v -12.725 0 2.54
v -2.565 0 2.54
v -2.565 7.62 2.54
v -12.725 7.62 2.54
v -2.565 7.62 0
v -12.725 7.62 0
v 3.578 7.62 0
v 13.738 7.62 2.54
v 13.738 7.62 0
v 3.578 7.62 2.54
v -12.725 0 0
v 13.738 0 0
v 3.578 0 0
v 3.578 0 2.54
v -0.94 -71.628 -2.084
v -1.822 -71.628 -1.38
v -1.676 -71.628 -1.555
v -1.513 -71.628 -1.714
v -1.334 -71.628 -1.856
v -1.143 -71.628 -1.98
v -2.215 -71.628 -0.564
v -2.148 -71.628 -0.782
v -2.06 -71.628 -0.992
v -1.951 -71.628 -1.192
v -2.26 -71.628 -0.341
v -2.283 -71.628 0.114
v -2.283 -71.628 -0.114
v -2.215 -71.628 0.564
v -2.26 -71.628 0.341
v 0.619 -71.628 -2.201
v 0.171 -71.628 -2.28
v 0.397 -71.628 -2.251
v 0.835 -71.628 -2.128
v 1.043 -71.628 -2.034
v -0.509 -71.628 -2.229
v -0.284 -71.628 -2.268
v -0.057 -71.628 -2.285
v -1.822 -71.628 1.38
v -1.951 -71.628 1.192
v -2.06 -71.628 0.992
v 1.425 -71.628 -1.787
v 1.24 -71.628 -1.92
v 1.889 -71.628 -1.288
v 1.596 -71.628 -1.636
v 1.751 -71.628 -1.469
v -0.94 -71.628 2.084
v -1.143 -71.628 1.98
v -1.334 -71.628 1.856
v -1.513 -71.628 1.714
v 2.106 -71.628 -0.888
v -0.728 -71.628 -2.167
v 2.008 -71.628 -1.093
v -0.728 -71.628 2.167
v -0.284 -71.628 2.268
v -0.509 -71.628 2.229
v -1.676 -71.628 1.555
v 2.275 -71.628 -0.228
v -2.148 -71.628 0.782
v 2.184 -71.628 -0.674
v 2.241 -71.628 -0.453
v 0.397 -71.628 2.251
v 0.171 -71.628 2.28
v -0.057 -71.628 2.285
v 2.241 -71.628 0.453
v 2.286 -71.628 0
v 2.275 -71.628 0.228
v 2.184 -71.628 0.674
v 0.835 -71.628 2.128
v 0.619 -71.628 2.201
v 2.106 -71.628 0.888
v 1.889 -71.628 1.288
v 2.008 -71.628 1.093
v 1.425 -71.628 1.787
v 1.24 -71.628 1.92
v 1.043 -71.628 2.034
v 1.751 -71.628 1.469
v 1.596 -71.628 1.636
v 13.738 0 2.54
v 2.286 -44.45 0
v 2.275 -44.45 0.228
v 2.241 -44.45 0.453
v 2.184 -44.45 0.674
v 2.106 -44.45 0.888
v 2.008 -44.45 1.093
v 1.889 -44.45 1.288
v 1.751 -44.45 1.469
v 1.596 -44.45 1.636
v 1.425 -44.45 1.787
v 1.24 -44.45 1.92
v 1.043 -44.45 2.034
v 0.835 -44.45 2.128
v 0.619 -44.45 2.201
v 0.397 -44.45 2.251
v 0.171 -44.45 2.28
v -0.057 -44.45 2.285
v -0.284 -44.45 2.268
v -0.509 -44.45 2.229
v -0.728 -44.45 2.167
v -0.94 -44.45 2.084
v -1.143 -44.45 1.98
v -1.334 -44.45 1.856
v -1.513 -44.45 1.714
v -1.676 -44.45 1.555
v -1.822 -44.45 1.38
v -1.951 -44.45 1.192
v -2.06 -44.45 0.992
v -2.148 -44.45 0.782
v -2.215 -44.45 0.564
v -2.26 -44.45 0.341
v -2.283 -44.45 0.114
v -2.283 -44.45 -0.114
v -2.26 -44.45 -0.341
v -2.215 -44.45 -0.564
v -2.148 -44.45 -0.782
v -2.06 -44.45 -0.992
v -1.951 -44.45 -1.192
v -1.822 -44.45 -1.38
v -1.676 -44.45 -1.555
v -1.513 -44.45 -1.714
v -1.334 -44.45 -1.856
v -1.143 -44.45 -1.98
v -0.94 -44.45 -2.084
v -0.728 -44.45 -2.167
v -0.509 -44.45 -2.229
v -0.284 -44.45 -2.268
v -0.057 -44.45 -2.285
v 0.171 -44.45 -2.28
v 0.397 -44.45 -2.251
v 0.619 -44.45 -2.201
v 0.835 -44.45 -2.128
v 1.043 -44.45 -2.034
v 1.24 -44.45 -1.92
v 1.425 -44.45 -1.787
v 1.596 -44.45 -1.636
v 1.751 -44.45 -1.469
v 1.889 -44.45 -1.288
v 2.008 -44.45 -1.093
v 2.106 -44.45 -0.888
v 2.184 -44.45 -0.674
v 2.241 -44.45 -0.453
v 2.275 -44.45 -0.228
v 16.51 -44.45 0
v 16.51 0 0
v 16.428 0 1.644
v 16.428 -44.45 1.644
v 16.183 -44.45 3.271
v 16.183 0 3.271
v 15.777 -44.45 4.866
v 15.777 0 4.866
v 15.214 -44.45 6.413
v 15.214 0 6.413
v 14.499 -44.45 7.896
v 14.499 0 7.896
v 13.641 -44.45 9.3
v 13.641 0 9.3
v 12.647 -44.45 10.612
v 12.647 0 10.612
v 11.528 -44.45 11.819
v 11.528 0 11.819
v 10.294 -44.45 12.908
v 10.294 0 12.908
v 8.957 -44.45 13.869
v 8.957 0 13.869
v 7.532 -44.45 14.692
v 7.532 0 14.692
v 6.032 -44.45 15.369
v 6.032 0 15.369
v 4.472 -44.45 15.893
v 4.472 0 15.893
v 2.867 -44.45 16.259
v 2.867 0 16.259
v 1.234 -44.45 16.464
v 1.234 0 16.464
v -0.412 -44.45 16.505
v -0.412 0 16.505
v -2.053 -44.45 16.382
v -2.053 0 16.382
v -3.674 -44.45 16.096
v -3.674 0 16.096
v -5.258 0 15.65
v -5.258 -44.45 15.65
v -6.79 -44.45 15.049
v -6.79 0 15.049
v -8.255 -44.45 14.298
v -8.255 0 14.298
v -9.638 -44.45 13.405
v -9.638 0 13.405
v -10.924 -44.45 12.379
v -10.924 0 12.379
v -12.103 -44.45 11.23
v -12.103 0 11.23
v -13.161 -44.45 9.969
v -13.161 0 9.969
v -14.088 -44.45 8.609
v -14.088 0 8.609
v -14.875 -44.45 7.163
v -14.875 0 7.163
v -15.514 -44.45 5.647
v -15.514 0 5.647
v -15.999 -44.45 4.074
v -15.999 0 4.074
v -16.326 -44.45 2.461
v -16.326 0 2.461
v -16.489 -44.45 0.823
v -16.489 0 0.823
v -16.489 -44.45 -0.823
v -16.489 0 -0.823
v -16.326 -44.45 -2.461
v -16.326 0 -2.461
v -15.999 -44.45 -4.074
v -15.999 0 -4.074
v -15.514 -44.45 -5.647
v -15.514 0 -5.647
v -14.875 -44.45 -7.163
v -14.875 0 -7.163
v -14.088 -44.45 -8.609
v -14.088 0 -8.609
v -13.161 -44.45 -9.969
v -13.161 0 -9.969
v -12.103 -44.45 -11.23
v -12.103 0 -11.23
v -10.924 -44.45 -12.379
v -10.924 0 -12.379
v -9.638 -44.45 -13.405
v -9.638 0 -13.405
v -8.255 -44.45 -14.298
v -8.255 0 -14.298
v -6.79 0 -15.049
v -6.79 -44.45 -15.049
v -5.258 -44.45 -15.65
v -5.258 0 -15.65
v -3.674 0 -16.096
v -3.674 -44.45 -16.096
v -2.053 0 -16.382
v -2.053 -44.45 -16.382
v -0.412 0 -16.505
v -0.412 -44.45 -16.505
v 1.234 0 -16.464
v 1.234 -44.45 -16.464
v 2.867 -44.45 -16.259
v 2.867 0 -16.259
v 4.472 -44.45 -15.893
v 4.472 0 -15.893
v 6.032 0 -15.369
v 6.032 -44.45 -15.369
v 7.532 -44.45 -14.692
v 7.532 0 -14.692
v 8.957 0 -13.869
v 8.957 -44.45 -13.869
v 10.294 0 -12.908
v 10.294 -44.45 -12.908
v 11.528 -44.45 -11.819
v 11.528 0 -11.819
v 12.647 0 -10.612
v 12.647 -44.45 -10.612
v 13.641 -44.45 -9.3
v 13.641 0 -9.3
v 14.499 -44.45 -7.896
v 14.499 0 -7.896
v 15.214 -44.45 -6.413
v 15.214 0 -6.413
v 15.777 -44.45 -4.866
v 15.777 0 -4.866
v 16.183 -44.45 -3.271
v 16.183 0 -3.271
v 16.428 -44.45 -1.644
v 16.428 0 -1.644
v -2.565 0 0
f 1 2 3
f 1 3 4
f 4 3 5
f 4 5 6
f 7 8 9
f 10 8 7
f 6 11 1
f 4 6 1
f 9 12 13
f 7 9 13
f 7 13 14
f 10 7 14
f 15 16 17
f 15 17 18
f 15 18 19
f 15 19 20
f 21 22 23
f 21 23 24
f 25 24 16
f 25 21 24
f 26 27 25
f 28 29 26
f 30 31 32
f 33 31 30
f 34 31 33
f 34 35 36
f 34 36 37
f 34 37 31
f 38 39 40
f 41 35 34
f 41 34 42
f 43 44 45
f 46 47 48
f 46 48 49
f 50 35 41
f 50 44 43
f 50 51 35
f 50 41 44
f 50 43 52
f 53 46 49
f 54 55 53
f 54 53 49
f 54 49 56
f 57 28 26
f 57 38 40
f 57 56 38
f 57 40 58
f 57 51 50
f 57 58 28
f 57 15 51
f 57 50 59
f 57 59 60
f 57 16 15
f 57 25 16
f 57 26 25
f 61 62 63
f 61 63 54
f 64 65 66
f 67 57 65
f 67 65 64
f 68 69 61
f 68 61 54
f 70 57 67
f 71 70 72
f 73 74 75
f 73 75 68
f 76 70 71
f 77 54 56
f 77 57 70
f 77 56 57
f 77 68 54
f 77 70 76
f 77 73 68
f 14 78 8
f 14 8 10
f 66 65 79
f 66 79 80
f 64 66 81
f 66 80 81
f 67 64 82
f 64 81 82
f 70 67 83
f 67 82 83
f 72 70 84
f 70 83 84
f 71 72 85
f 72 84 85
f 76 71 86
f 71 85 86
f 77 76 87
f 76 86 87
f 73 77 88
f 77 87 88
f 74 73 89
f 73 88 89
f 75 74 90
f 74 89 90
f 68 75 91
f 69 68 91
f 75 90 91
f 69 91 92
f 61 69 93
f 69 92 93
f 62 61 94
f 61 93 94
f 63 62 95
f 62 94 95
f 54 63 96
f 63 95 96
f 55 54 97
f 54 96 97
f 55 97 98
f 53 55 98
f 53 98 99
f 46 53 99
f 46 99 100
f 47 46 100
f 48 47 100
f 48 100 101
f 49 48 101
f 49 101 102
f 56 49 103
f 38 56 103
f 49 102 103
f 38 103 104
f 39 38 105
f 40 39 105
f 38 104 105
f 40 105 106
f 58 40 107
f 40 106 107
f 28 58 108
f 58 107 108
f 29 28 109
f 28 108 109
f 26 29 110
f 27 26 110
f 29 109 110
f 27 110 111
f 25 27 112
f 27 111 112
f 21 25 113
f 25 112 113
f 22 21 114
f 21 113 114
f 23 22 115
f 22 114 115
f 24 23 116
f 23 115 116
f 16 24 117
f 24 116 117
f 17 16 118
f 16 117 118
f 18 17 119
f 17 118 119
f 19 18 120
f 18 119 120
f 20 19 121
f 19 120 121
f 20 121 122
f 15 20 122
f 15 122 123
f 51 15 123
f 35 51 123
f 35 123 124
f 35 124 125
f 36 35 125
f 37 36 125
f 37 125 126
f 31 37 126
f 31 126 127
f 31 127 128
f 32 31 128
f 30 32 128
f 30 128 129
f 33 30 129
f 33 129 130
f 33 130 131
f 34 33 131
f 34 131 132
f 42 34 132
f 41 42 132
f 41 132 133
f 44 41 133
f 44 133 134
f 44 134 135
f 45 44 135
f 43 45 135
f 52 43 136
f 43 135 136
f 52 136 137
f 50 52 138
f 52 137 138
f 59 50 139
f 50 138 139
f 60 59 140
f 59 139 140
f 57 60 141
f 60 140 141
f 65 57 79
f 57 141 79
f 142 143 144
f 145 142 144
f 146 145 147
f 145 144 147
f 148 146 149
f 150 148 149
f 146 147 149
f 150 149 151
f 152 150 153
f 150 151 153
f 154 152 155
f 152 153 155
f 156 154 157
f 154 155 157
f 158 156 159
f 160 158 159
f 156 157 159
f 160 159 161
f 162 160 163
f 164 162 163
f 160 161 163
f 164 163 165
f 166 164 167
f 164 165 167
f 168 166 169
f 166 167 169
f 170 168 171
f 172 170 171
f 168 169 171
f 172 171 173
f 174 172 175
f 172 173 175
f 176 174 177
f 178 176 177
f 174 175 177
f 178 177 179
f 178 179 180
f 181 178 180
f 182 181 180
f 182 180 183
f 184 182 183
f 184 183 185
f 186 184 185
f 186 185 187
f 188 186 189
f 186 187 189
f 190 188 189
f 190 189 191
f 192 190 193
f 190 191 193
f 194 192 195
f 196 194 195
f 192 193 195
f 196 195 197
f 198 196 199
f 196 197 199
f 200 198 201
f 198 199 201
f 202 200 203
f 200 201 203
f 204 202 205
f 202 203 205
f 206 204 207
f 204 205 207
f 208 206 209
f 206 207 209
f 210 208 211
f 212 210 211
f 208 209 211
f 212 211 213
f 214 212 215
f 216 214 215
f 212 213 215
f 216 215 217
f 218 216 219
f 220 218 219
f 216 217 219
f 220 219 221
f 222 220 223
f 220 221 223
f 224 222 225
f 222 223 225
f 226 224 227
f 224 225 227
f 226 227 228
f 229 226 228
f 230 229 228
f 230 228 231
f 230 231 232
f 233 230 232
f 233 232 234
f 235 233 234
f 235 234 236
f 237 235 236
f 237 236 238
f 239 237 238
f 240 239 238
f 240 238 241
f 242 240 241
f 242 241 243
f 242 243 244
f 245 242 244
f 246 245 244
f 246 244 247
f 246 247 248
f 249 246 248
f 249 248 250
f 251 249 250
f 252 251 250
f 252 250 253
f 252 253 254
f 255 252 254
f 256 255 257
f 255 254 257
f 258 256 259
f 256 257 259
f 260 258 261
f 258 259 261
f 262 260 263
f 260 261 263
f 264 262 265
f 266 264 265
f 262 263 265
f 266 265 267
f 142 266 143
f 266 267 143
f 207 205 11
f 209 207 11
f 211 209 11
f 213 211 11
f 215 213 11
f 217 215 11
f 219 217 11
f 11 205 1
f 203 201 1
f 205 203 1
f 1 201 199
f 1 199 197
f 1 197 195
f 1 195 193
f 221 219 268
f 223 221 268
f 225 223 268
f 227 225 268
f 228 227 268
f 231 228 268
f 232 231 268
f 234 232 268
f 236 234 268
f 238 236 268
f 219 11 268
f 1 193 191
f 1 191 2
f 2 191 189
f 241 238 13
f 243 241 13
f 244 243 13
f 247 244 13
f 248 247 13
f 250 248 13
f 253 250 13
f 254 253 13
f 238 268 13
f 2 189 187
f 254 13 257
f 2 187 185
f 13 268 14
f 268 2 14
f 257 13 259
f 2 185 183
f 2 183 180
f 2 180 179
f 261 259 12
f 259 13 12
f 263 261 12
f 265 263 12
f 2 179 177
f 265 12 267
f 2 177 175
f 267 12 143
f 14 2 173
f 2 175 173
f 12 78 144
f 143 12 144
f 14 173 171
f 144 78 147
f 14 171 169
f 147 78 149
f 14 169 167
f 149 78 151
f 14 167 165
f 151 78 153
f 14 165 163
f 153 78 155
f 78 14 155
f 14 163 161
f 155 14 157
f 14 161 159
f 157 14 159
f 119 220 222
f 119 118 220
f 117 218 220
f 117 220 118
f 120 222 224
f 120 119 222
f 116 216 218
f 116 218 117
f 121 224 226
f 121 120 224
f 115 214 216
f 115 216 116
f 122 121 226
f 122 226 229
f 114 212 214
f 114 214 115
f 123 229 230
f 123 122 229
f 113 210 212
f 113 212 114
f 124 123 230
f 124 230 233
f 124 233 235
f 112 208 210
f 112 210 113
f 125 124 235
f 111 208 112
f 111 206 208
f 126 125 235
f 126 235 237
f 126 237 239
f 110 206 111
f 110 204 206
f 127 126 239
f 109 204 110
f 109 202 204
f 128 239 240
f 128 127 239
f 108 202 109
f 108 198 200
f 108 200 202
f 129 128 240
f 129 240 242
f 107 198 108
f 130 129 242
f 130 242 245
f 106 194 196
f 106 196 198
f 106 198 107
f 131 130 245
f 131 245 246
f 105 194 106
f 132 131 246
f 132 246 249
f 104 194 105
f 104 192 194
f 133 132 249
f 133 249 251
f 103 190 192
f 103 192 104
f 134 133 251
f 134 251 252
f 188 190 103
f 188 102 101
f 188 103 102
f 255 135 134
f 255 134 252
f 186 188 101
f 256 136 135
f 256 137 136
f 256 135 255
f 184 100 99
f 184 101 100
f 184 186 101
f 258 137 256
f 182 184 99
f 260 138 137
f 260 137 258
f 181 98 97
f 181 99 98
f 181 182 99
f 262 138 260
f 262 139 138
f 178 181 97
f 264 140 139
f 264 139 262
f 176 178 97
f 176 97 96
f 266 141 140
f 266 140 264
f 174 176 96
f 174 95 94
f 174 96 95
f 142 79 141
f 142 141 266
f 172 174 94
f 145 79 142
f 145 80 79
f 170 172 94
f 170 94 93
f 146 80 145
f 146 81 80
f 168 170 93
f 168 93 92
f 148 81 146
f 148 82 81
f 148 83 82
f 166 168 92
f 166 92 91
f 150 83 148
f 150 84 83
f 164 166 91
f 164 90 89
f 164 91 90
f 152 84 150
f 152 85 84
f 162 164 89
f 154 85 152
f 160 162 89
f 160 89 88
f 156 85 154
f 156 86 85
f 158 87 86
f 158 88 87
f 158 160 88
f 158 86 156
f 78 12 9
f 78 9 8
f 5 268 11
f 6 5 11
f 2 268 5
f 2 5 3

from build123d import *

# Parameters (mm, degrees)
F0_R     = 16.51
F1_DEPTH = 44.45
F2_R     = 2.286
F3_DEPTH = 27.178
F4_W     = 10.16
F4_H     = 2.54
F5_DEPTH = 7.62


with BuildPart() as f1:
    # F0 (on Front) → F1 (new body)
    with BuildSketch(Plane.XZ):
        Circle(F0_R)
    extrude(amount=F1_DEPTH)

    # F2 (on face) → F3 (join)
    with BuildSketch(Plane.XZ.offset(44.45)):
        Circle(F2_R)
    extrude(amount=F3_DEPTH)

    # F4 (on face) → F5 (join)
    with BuildSketch(Plane(origin=(0, 0, 0), x_dir=(-1, 0, 0), z_dir=(0, 1, 0))):
        with Locations((-8.658255, 1.27)):
            Rectangle(F4_W, F4_H)
        with Locations((7.64519, 1.27)):
            Rectangle(F4_W, F4_H)
    extrude(amount=F5_DEPTH)


solid = f1.part
